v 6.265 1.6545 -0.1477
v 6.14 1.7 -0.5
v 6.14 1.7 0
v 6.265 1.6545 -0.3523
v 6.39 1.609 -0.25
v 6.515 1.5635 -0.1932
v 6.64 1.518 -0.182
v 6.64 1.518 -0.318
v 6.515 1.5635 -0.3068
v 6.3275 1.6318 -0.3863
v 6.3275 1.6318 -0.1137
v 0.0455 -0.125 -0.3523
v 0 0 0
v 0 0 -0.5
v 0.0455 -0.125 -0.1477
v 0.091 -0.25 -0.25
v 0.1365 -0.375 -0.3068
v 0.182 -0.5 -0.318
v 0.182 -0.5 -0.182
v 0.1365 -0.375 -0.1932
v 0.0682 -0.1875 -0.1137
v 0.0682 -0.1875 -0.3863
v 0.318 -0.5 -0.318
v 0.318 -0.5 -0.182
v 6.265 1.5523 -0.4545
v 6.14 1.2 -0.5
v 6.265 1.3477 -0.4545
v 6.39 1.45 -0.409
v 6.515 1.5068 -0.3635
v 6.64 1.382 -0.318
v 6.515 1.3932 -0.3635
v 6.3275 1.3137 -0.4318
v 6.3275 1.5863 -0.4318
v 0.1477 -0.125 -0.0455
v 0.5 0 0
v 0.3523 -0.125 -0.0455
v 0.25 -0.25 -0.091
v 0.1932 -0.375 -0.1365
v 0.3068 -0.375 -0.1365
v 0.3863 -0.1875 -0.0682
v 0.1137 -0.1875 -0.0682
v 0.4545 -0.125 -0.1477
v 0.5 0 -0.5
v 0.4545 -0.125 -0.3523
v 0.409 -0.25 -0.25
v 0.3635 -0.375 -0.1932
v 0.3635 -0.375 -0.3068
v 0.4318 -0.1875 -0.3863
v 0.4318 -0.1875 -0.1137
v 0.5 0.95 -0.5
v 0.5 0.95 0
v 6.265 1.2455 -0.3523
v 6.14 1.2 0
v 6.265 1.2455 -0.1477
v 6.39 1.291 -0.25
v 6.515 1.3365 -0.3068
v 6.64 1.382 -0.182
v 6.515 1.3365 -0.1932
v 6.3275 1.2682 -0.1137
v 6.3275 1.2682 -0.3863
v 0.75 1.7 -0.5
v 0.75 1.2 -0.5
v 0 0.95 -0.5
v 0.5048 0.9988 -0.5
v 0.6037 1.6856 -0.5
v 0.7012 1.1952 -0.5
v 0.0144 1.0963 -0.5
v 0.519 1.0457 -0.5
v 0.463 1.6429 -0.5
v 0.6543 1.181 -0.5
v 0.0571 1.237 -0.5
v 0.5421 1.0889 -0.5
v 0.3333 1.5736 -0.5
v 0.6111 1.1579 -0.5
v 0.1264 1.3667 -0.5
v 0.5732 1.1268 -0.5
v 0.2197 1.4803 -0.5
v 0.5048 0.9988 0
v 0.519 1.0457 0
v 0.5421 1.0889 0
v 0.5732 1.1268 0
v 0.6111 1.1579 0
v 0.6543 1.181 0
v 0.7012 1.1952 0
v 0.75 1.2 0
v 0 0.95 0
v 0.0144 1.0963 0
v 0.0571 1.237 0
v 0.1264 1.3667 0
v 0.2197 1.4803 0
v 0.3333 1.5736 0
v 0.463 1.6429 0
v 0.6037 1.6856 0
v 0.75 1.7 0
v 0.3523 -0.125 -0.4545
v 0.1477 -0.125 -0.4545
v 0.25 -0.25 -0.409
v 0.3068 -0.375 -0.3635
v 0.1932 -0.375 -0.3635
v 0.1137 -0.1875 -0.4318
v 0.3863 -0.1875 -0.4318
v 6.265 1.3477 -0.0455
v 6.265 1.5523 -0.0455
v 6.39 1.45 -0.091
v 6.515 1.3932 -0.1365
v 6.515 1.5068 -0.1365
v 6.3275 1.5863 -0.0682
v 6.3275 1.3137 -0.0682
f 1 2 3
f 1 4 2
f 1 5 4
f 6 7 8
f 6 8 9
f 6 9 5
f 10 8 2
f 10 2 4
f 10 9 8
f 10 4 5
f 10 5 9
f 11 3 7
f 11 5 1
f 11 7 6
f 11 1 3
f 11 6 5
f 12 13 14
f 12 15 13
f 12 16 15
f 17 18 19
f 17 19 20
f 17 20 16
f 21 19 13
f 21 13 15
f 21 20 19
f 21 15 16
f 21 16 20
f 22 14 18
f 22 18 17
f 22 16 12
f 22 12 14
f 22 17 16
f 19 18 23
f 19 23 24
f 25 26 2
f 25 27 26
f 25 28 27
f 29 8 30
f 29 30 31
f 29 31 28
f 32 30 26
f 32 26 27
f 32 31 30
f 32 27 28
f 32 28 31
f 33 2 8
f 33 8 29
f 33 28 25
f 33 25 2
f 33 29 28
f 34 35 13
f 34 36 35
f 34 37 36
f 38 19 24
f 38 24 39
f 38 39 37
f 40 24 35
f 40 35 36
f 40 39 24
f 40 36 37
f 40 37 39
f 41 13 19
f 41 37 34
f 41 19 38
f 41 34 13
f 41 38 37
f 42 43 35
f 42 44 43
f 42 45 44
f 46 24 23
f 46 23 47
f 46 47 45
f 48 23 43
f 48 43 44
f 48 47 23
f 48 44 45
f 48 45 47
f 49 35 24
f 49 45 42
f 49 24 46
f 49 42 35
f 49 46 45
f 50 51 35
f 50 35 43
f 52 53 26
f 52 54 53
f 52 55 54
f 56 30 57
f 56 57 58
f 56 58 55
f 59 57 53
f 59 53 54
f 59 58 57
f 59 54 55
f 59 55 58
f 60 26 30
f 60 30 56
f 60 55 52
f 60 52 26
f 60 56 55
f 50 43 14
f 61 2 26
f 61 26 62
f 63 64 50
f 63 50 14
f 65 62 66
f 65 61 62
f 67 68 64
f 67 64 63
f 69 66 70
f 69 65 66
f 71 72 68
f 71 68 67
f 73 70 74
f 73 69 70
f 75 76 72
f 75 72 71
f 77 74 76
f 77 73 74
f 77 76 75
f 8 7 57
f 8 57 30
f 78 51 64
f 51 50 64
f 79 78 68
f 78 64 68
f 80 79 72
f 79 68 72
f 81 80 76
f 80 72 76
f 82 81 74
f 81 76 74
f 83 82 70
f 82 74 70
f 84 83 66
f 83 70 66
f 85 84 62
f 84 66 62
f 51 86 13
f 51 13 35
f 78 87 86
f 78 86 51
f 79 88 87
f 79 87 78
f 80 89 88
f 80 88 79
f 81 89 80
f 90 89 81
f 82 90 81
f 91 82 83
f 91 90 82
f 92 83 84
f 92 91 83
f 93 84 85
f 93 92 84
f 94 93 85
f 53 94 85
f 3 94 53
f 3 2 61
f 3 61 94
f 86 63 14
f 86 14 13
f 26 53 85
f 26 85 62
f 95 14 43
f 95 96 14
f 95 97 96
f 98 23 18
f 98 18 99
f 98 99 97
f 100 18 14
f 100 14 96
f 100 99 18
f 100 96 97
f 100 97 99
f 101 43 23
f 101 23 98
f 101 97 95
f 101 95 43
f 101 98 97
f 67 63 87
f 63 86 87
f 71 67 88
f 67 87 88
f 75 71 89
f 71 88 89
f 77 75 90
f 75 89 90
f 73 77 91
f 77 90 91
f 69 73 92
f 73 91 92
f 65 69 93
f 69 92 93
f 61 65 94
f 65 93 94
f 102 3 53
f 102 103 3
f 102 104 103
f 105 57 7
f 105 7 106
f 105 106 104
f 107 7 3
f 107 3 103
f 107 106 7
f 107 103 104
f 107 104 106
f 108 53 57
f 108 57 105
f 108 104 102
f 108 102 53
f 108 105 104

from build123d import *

# Parameters (mm, degrees)
SKETCH1_W           = 0.5
SKETCH1_H           = 0.5
SKETCH6_W           = 0.5
SKETCH6_H           = 0.5
BOSS_EXTRUDE1_DEPTH = 0.5
BOSS_EXTRUDE1_TAPER = 20
SKETCH7_W           = 0.5
SKETCH7_H           = 0.5
BOSS_EXTRUDE2_DEPTH = 0.5
BOSS_EXTRUDE2_TAPER = 20


with BuildPart() as part:
    # Sweep4: sweep along a path in Sketch2
    with BuildLine(Plane.XY) as sweep4_path:
        Line((0.25, 0), (0.25, 0.95))
        ThreePointArc((0.25, 0.95), (0.396446609, 1.303553391), (0.75, 1.45))
        Line((0.75, 1.45), (6.14, 1.45))
    # Sketch1 → Sweep4 (sweep)
    with BuildSketch(Plane(origin=(0, 0, 0), x_dir=(1, 0, 0), z_dir=(0, 1, 0))):
        with Locations((0.25, 0.25)):
            Rectangle(SKETCH1_W, SKETCH1_H)
    sweep(path=sweep4_path.line)

    # Sketch6 → Boss-Extrude1 (add)
    with BuildSketch(Plane(origin=(6.14, 0, 0), x_dir=(0, 0, -1), z_dir=(1, 0, 0))):
        with Locations((0.25, 1.45)):
            Rectangle(SKETCH6_W, SKETCH6_H)
    extrude(amount=BOSS_EXTRUDE1_DEPTH, taper=BOSS_EXTRUDE1_TAPER)

    # Sketch7 → Boss-Extrude2 (add)
    with BuildSketch(Plane.XZ):
        with Locations((0.25, -0.25)):
            Rectangle(SKETCH7_W, SKETCH7_H)
    extrude(amount=BOSS_EXTRUDE2_DEPTH, taper=BOSS_EXTRUDE2_TAPER)


solid = part.part
